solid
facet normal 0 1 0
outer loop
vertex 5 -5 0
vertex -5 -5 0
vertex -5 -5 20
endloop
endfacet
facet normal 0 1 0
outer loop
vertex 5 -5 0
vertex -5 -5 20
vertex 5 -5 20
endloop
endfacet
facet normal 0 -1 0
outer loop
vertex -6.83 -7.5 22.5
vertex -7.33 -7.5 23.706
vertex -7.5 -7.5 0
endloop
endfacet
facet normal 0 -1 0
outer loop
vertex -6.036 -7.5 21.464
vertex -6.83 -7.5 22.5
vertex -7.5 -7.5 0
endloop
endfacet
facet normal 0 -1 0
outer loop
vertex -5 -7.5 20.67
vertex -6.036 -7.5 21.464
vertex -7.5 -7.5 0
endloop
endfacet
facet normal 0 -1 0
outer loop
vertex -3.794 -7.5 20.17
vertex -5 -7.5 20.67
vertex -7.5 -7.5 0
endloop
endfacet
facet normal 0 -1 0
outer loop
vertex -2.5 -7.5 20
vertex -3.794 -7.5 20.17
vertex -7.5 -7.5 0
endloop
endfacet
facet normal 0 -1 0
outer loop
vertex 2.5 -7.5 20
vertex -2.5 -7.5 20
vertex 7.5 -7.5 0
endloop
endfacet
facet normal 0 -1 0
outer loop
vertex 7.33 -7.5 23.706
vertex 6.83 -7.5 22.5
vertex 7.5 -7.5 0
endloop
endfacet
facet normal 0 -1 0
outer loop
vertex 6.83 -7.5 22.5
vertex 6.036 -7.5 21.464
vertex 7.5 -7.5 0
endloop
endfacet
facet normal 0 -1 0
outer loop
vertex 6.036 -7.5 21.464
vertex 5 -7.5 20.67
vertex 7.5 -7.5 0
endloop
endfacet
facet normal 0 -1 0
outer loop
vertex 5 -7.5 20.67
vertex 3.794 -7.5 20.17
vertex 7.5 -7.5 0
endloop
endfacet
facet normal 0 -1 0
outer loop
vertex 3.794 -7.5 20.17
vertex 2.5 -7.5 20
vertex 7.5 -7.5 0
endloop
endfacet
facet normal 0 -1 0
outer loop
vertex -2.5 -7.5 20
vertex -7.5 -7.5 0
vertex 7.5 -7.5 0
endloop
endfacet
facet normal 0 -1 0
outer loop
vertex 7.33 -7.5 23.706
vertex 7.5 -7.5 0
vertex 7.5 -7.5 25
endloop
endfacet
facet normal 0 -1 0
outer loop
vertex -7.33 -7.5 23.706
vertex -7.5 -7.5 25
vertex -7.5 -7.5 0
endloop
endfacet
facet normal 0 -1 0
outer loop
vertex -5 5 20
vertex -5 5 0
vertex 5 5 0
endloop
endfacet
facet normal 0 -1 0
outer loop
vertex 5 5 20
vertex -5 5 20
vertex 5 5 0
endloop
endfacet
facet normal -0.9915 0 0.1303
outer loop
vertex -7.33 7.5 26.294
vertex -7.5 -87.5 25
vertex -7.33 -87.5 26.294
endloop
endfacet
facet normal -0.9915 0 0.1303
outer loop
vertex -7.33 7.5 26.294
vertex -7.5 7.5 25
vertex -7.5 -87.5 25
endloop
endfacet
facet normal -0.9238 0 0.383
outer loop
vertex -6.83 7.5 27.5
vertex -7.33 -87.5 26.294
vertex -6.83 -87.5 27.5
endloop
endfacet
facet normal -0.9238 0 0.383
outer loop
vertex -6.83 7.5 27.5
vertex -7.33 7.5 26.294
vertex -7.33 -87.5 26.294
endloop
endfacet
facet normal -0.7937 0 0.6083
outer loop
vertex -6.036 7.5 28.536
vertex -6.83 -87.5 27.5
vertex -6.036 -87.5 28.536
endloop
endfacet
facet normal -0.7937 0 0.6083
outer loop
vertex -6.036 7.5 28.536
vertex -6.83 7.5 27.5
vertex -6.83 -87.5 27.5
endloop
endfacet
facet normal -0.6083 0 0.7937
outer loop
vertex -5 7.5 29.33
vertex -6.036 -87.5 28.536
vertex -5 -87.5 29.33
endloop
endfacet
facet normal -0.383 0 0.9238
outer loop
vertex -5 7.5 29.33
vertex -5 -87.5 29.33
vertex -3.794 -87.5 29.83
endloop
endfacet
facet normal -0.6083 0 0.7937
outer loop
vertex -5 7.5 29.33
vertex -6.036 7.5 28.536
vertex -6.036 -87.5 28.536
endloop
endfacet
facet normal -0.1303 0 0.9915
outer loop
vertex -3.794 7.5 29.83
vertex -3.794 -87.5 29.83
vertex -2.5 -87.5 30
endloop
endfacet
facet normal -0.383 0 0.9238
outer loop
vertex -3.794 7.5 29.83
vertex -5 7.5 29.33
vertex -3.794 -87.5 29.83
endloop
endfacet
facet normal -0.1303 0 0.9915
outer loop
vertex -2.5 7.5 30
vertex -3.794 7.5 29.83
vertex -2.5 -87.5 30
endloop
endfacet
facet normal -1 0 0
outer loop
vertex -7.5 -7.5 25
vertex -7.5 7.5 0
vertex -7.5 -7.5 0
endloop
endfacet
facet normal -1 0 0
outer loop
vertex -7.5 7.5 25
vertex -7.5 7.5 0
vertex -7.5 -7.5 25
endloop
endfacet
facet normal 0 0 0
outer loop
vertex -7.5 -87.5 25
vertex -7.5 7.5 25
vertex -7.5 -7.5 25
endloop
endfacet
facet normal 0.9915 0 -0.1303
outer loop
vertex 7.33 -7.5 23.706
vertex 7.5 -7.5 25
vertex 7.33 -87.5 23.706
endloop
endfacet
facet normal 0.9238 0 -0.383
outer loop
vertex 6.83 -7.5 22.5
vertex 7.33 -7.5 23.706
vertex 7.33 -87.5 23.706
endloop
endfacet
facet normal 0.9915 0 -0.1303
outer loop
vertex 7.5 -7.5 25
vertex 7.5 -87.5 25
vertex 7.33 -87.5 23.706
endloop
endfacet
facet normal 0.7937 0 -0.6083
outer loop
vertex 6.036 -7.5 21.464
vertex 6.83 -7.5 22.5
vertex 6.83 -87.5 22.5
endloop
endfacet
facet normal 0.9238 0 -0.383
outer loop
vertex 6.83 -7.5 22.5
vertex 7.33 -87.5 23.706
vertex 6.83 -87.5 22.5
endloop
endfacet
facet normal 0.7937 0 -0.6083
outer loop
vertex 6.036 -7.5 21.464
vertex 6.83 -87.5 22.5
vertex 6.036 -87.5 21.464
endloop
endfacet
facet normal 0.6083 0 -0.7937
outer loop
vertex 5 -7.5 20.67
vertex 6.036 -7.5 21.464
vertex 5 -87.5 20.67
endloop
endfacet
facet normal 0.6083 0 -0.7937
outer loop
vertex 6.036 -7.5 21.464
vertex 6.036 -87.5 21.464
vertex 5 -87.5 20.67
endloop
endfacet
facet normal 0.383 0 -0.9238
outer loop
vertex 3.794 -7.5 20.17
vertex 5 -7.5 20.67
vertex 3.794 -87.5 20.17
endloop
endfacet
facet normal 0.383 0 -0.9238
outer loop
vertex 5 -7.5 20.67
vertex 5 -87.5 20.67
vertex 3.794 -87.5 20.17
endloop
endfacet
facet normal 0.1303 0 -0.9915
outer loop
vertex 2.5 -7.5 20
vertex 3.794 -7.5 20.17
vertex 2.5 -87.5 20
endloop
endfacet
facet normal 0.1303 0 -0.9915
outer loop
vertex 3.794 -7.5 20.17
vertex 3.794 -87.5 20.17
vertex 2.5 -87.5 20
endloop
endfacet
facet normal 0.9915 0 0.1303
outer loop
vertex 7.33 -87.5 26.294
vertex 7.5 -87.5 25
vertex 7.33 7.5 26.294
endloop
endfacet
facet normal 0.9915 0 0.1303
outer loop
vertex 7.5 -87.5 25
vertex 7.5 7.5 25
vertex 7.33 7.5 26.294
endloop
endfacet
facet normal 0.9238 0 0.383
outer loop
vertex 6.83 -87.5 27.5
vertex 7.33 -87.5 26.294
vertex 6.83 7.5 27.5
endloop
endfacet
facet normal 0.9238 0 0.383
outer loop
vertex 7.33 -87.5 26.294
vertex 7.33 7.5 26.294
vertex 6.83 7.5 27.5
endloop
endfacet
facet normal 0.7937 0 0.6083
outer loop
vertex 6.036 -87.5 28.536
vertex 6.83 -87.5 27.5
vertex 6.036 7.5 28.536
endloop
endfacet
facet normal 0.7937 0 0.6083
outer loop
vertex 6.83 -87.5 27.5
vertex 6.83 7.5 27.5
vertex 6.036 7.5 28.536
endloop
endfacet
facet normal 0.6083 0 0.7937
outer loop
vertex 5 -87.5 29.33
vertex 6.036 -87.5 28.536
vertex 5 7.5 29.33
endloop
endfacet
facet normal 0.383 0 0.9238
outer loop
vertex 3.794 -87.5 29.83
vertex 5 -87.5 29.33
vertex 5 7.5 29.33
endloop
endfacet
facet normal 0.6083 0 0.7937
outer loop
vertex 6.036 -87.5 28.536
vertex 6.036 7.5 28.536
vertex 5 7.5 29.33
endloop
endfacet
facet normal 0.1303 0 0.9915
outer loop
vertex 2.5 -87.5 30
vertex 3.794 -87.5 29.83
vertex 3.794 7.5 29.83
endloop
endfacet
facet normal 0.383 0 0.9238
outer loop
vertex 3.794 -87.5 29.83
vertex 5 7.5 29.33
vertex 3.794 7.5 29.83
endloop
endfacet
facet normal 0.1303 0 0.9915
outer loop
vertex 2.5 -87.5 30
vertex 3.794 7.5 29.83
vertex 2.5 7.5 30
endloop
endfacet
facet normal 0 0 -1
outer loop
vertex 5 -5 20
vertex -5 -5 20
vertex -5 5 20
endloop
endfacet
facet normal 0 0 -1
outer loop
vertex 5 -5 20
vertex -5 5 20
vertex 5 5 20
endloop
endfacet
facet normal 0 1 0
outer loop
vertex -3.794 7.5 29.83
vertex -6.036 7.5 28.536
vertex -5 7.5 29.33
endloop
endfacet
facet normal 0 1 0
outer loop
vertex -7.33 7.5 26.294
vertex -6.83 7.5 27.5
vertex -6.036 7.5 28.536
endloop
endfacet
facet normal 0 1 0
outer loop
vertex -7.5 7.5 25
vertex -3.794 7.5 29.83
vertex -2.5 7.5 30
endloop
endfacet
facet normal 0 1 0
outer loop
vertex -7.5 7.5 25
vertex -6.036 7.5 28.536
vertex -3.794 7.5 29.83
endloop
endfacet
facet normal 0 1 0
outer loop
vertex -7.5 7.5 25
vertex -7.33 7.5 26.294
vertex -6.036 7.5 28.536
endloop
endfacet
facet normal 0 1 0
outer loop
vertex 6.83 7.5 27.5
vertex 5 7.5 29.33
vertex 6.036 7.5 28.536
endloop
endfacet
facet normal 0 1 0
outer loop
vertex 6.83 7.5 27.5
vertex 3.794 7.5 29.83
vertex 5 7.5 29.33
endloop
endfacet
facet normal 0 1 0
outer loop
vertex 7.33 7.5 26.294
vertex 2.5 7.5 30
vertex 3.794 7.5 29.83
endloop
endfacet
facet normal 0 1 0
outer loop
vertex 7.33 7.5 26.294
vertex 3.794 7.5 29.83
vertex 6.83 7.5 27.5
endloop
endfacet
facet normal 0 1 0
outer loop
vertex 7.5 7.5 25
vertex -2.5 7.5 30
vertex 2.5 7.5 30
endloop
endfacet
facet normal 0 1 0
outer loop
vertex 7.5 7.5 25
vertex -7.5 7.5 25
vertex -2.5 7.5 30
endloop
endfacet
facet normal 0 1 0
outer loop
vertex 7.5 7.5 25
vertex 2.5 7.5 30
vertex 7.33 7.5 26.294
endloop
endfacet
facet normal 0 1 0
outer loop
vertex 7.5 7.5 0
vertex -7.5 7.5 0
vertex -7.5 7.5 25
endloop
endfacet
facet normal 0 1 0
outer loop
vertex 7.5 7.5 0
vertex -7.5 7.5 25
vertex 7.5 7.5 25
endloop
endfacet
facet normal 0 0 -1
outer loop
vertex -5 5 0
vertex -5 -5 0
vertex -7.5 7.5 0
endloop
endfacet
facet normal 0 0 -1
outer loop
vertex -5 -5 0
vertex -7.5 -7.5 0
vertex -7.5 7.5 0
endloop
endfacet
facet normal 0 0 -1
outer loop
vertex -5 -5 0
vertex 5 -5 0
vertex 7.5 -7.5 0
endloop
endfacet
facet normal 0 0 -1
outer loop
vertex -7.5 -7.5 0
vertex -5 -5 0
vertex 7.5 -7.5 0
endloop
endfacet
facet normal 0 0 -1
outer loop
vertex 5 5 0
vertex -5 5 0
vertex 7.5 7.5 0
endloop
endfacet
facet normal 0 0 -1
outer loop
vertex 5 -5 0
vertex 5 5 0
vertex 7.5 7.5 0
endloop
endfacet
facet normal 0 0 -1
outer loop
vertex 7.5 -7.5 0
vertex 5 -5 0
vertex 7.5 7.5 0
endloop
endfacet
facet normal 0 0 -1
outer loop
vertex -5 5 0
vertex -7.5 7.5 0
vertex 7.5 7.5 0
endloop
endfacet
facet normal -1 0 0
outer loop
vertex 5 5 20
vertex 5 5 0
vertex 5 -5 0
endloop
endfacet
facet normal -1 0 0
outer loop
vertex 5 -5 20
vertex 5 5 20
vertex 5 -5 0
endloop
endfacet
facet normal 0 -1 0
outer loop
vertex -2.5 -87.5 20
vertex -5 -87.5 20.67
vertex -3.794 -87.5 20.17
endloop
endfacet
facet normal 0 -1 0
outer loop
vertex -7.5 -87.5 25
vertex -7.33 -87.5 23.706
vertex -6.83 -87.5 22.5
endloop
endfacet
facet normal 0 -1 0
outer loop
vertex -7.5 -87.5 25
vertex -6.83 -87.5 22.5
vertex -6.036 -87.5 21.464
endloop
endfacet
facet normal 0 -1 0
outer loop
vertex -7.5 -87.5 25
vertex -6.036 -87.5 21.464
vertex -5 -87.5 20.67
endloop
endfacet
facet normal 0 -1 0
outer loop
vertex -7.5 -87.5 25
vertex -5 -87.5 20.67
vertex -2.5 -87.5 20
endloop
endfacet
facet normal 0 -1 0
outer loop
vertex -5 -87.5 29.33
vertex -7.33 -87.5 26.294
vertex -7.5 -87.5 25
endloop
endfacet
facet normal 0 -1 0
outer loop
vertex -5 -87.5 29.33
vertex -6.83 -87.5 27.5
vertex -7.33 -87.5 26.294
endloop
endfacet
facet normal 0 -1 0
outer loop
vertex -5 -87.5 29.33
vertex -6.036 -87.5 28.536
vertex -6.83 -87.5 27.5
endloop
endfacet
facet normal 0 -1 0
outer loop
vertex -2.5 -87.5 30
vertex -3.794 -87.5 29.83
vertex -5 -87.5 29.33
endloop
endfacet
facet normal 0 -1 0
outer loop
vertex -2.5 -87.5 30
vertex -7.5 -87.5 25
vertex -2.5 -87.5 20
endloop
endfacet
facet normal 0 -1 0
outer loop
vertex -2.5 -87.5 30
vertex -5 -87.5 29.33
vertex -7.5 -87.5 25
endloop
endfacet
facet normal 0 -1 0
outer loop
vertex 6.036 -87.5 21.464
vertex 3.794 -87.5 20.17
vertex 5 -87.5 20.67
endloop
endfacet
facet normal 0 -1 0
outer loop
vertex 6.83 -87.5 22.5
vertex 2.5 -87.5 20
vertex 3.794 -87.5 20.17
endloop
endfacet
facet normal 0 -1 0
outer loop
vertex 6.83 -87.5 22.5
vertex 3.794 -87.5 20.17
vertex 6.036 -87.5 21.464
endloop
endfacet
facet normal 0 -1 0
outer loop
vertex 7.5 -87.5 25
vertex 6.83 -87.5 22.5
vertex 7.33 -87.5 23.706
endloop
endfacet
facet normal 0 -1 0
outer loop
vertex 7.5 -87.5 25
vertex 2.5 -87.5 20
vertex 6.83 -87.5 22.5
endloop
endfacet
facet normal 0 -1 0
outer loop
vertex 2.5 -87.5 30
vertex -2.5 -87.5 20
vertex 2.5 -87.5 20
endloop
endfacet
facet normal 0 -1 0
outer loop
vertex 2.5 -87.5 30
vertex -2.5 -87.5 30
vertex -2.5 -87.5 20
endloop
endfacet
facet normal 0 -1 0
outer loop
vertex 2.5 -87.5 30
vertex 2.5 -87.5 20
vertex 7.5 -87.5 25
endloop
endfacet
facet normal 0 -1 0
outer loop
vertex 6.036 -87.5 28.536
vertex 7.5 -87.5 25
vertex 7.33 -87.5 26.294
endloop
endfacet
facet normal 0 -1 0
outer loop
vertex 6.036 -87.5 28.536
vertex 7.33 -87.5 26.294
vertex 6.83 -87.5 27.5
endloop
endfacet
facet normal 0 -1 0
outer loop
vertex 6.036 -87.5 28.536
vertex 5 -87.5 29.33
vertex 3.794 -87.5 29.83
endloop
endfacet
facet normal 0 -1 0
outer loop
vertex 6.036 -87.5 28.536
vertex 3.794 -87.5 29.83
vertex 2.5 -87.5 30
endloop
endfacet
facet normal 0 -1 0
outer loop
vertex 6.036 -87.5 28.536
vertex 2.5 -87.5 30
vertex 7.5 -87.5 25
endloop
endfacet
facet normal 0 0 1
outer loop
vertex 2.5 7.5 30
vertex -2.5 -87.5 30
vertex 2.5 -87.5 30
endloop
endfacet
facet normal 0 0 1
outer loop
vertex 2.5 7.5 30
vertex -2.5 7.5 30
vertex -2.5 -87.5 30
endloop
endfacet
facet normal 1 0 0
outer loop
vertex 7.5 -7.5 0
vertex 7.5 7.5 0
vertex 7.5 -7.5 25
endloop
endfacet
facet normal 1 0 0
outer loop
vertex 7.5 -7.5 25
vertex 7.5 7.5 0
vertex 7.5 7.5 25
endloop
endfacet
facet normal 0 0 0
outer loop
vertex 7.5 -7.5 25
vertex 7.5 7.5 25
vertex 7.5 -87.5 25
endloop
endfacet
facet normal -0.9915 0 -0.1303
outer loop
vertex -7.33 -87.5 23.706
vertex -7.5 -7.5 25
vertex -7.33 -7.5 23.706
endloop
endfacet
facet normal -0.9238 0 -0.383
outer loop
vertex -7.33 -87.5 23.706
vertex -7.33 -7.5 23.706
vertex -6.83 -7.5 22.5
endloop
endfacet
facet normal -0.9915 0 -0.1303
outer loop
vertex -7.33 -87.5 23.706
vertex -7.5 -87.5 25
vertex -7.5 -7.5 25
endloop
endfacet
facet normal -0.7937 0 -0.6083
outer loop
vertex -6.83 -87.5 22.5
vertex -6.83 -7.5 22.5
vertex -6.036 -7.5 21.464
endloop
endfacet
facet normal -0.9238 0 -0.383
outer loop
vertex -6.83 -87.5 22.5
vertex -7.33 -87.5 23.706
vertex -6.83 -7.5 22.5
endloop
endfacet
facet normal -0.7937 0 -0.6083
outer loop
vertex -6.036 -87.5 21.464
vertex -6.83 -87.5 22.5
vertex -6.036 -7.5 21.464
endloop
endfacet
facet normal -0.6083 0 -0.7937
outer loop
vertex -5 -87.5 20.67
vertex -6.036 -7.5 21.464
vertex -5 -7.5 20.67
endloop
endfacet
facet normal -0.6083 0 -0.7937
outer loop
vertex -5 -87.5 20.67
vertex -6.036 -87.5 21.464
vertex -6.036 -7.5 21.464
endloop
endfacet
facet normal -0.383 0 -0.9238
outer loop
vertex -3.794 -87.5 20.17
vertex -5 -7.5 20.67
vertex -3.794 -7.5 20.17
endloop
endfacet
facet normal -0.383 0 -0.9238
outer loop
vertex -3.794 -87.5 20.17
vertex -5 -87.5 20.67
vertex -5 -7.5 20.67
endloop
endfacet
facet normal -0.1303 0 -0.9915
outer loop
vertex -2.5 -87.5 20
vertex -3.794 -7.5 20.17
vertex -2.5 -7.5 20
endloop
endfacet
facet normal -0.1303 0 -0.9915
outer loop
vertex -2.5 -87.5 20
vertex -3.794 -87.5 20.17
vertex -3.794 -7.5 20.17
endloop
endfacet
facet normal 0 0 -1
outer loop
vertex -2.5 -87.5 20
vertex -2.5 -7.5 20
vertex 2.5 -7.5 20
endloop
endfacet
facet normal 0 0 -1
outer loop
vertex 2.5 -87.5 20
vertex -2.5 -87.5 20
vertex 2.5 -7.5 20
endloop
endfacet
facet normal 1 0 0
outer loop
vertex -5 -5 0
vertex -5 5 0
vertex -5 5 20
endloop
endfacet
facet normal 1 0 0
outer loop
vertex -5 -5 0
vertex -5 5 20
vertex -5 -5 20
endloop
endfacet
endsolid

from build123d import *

# Parameters (mm, degrees)
F0_W     = 15
F0_H     = 15
F1_DEPTH = 30
F2_W     = 15
F2_H     = 10
F3_DEPTH = 80
F4_R     = 4.99999
F5_W     = 10
F5_H     = 10
F6_DEPTH = 20


# Not quite as in the source:
# - a fillet or chamfer is up to 0.001 mm smaller than in the source, because OpenCascade refuses the exact size


with BuildPart() as f1:
    # F0 (on Top) → F1 (new body)
    with BuildSketch(Plane.XY):
        Rectangle(F0_W, F0_H)
    extrude(amount=F1_DEPTH)

    # F2 (on face) → F3 (join)
    with BuildSketch(Plane.XZ.offset(7.5)):
        with Locations((0, 25)):
            Rectangle(F2_W, F2_H)
    extrude(amount=F3_DEPTH)

    # F4 (radius 5 in the source; OpenCascade refuses exactly that, so slightly less here)
    f4_edges = [f1.edges().sort_by_distance(p)[0] for p in [
        (7.5, -40, 30),
        (-7.5, -40, 30),
        (7.5, -47.5, 20),
        (-7.5, -47.5, 20),
    ]]
    fillet(f4_edges, radius=F4_R)

    # F5 (on face) → F6 (cut)
    with BuildSketch(Plane(origin=(0, 0, 0), x_dir=(1, 0, 0), z_dir=(0, 0, -1))):
        Rectangle(F5_W, F5_H)
    extrude(amount=-F6_DEPTH, mode=Mode.SUBTRACT)


solid = f1.part
